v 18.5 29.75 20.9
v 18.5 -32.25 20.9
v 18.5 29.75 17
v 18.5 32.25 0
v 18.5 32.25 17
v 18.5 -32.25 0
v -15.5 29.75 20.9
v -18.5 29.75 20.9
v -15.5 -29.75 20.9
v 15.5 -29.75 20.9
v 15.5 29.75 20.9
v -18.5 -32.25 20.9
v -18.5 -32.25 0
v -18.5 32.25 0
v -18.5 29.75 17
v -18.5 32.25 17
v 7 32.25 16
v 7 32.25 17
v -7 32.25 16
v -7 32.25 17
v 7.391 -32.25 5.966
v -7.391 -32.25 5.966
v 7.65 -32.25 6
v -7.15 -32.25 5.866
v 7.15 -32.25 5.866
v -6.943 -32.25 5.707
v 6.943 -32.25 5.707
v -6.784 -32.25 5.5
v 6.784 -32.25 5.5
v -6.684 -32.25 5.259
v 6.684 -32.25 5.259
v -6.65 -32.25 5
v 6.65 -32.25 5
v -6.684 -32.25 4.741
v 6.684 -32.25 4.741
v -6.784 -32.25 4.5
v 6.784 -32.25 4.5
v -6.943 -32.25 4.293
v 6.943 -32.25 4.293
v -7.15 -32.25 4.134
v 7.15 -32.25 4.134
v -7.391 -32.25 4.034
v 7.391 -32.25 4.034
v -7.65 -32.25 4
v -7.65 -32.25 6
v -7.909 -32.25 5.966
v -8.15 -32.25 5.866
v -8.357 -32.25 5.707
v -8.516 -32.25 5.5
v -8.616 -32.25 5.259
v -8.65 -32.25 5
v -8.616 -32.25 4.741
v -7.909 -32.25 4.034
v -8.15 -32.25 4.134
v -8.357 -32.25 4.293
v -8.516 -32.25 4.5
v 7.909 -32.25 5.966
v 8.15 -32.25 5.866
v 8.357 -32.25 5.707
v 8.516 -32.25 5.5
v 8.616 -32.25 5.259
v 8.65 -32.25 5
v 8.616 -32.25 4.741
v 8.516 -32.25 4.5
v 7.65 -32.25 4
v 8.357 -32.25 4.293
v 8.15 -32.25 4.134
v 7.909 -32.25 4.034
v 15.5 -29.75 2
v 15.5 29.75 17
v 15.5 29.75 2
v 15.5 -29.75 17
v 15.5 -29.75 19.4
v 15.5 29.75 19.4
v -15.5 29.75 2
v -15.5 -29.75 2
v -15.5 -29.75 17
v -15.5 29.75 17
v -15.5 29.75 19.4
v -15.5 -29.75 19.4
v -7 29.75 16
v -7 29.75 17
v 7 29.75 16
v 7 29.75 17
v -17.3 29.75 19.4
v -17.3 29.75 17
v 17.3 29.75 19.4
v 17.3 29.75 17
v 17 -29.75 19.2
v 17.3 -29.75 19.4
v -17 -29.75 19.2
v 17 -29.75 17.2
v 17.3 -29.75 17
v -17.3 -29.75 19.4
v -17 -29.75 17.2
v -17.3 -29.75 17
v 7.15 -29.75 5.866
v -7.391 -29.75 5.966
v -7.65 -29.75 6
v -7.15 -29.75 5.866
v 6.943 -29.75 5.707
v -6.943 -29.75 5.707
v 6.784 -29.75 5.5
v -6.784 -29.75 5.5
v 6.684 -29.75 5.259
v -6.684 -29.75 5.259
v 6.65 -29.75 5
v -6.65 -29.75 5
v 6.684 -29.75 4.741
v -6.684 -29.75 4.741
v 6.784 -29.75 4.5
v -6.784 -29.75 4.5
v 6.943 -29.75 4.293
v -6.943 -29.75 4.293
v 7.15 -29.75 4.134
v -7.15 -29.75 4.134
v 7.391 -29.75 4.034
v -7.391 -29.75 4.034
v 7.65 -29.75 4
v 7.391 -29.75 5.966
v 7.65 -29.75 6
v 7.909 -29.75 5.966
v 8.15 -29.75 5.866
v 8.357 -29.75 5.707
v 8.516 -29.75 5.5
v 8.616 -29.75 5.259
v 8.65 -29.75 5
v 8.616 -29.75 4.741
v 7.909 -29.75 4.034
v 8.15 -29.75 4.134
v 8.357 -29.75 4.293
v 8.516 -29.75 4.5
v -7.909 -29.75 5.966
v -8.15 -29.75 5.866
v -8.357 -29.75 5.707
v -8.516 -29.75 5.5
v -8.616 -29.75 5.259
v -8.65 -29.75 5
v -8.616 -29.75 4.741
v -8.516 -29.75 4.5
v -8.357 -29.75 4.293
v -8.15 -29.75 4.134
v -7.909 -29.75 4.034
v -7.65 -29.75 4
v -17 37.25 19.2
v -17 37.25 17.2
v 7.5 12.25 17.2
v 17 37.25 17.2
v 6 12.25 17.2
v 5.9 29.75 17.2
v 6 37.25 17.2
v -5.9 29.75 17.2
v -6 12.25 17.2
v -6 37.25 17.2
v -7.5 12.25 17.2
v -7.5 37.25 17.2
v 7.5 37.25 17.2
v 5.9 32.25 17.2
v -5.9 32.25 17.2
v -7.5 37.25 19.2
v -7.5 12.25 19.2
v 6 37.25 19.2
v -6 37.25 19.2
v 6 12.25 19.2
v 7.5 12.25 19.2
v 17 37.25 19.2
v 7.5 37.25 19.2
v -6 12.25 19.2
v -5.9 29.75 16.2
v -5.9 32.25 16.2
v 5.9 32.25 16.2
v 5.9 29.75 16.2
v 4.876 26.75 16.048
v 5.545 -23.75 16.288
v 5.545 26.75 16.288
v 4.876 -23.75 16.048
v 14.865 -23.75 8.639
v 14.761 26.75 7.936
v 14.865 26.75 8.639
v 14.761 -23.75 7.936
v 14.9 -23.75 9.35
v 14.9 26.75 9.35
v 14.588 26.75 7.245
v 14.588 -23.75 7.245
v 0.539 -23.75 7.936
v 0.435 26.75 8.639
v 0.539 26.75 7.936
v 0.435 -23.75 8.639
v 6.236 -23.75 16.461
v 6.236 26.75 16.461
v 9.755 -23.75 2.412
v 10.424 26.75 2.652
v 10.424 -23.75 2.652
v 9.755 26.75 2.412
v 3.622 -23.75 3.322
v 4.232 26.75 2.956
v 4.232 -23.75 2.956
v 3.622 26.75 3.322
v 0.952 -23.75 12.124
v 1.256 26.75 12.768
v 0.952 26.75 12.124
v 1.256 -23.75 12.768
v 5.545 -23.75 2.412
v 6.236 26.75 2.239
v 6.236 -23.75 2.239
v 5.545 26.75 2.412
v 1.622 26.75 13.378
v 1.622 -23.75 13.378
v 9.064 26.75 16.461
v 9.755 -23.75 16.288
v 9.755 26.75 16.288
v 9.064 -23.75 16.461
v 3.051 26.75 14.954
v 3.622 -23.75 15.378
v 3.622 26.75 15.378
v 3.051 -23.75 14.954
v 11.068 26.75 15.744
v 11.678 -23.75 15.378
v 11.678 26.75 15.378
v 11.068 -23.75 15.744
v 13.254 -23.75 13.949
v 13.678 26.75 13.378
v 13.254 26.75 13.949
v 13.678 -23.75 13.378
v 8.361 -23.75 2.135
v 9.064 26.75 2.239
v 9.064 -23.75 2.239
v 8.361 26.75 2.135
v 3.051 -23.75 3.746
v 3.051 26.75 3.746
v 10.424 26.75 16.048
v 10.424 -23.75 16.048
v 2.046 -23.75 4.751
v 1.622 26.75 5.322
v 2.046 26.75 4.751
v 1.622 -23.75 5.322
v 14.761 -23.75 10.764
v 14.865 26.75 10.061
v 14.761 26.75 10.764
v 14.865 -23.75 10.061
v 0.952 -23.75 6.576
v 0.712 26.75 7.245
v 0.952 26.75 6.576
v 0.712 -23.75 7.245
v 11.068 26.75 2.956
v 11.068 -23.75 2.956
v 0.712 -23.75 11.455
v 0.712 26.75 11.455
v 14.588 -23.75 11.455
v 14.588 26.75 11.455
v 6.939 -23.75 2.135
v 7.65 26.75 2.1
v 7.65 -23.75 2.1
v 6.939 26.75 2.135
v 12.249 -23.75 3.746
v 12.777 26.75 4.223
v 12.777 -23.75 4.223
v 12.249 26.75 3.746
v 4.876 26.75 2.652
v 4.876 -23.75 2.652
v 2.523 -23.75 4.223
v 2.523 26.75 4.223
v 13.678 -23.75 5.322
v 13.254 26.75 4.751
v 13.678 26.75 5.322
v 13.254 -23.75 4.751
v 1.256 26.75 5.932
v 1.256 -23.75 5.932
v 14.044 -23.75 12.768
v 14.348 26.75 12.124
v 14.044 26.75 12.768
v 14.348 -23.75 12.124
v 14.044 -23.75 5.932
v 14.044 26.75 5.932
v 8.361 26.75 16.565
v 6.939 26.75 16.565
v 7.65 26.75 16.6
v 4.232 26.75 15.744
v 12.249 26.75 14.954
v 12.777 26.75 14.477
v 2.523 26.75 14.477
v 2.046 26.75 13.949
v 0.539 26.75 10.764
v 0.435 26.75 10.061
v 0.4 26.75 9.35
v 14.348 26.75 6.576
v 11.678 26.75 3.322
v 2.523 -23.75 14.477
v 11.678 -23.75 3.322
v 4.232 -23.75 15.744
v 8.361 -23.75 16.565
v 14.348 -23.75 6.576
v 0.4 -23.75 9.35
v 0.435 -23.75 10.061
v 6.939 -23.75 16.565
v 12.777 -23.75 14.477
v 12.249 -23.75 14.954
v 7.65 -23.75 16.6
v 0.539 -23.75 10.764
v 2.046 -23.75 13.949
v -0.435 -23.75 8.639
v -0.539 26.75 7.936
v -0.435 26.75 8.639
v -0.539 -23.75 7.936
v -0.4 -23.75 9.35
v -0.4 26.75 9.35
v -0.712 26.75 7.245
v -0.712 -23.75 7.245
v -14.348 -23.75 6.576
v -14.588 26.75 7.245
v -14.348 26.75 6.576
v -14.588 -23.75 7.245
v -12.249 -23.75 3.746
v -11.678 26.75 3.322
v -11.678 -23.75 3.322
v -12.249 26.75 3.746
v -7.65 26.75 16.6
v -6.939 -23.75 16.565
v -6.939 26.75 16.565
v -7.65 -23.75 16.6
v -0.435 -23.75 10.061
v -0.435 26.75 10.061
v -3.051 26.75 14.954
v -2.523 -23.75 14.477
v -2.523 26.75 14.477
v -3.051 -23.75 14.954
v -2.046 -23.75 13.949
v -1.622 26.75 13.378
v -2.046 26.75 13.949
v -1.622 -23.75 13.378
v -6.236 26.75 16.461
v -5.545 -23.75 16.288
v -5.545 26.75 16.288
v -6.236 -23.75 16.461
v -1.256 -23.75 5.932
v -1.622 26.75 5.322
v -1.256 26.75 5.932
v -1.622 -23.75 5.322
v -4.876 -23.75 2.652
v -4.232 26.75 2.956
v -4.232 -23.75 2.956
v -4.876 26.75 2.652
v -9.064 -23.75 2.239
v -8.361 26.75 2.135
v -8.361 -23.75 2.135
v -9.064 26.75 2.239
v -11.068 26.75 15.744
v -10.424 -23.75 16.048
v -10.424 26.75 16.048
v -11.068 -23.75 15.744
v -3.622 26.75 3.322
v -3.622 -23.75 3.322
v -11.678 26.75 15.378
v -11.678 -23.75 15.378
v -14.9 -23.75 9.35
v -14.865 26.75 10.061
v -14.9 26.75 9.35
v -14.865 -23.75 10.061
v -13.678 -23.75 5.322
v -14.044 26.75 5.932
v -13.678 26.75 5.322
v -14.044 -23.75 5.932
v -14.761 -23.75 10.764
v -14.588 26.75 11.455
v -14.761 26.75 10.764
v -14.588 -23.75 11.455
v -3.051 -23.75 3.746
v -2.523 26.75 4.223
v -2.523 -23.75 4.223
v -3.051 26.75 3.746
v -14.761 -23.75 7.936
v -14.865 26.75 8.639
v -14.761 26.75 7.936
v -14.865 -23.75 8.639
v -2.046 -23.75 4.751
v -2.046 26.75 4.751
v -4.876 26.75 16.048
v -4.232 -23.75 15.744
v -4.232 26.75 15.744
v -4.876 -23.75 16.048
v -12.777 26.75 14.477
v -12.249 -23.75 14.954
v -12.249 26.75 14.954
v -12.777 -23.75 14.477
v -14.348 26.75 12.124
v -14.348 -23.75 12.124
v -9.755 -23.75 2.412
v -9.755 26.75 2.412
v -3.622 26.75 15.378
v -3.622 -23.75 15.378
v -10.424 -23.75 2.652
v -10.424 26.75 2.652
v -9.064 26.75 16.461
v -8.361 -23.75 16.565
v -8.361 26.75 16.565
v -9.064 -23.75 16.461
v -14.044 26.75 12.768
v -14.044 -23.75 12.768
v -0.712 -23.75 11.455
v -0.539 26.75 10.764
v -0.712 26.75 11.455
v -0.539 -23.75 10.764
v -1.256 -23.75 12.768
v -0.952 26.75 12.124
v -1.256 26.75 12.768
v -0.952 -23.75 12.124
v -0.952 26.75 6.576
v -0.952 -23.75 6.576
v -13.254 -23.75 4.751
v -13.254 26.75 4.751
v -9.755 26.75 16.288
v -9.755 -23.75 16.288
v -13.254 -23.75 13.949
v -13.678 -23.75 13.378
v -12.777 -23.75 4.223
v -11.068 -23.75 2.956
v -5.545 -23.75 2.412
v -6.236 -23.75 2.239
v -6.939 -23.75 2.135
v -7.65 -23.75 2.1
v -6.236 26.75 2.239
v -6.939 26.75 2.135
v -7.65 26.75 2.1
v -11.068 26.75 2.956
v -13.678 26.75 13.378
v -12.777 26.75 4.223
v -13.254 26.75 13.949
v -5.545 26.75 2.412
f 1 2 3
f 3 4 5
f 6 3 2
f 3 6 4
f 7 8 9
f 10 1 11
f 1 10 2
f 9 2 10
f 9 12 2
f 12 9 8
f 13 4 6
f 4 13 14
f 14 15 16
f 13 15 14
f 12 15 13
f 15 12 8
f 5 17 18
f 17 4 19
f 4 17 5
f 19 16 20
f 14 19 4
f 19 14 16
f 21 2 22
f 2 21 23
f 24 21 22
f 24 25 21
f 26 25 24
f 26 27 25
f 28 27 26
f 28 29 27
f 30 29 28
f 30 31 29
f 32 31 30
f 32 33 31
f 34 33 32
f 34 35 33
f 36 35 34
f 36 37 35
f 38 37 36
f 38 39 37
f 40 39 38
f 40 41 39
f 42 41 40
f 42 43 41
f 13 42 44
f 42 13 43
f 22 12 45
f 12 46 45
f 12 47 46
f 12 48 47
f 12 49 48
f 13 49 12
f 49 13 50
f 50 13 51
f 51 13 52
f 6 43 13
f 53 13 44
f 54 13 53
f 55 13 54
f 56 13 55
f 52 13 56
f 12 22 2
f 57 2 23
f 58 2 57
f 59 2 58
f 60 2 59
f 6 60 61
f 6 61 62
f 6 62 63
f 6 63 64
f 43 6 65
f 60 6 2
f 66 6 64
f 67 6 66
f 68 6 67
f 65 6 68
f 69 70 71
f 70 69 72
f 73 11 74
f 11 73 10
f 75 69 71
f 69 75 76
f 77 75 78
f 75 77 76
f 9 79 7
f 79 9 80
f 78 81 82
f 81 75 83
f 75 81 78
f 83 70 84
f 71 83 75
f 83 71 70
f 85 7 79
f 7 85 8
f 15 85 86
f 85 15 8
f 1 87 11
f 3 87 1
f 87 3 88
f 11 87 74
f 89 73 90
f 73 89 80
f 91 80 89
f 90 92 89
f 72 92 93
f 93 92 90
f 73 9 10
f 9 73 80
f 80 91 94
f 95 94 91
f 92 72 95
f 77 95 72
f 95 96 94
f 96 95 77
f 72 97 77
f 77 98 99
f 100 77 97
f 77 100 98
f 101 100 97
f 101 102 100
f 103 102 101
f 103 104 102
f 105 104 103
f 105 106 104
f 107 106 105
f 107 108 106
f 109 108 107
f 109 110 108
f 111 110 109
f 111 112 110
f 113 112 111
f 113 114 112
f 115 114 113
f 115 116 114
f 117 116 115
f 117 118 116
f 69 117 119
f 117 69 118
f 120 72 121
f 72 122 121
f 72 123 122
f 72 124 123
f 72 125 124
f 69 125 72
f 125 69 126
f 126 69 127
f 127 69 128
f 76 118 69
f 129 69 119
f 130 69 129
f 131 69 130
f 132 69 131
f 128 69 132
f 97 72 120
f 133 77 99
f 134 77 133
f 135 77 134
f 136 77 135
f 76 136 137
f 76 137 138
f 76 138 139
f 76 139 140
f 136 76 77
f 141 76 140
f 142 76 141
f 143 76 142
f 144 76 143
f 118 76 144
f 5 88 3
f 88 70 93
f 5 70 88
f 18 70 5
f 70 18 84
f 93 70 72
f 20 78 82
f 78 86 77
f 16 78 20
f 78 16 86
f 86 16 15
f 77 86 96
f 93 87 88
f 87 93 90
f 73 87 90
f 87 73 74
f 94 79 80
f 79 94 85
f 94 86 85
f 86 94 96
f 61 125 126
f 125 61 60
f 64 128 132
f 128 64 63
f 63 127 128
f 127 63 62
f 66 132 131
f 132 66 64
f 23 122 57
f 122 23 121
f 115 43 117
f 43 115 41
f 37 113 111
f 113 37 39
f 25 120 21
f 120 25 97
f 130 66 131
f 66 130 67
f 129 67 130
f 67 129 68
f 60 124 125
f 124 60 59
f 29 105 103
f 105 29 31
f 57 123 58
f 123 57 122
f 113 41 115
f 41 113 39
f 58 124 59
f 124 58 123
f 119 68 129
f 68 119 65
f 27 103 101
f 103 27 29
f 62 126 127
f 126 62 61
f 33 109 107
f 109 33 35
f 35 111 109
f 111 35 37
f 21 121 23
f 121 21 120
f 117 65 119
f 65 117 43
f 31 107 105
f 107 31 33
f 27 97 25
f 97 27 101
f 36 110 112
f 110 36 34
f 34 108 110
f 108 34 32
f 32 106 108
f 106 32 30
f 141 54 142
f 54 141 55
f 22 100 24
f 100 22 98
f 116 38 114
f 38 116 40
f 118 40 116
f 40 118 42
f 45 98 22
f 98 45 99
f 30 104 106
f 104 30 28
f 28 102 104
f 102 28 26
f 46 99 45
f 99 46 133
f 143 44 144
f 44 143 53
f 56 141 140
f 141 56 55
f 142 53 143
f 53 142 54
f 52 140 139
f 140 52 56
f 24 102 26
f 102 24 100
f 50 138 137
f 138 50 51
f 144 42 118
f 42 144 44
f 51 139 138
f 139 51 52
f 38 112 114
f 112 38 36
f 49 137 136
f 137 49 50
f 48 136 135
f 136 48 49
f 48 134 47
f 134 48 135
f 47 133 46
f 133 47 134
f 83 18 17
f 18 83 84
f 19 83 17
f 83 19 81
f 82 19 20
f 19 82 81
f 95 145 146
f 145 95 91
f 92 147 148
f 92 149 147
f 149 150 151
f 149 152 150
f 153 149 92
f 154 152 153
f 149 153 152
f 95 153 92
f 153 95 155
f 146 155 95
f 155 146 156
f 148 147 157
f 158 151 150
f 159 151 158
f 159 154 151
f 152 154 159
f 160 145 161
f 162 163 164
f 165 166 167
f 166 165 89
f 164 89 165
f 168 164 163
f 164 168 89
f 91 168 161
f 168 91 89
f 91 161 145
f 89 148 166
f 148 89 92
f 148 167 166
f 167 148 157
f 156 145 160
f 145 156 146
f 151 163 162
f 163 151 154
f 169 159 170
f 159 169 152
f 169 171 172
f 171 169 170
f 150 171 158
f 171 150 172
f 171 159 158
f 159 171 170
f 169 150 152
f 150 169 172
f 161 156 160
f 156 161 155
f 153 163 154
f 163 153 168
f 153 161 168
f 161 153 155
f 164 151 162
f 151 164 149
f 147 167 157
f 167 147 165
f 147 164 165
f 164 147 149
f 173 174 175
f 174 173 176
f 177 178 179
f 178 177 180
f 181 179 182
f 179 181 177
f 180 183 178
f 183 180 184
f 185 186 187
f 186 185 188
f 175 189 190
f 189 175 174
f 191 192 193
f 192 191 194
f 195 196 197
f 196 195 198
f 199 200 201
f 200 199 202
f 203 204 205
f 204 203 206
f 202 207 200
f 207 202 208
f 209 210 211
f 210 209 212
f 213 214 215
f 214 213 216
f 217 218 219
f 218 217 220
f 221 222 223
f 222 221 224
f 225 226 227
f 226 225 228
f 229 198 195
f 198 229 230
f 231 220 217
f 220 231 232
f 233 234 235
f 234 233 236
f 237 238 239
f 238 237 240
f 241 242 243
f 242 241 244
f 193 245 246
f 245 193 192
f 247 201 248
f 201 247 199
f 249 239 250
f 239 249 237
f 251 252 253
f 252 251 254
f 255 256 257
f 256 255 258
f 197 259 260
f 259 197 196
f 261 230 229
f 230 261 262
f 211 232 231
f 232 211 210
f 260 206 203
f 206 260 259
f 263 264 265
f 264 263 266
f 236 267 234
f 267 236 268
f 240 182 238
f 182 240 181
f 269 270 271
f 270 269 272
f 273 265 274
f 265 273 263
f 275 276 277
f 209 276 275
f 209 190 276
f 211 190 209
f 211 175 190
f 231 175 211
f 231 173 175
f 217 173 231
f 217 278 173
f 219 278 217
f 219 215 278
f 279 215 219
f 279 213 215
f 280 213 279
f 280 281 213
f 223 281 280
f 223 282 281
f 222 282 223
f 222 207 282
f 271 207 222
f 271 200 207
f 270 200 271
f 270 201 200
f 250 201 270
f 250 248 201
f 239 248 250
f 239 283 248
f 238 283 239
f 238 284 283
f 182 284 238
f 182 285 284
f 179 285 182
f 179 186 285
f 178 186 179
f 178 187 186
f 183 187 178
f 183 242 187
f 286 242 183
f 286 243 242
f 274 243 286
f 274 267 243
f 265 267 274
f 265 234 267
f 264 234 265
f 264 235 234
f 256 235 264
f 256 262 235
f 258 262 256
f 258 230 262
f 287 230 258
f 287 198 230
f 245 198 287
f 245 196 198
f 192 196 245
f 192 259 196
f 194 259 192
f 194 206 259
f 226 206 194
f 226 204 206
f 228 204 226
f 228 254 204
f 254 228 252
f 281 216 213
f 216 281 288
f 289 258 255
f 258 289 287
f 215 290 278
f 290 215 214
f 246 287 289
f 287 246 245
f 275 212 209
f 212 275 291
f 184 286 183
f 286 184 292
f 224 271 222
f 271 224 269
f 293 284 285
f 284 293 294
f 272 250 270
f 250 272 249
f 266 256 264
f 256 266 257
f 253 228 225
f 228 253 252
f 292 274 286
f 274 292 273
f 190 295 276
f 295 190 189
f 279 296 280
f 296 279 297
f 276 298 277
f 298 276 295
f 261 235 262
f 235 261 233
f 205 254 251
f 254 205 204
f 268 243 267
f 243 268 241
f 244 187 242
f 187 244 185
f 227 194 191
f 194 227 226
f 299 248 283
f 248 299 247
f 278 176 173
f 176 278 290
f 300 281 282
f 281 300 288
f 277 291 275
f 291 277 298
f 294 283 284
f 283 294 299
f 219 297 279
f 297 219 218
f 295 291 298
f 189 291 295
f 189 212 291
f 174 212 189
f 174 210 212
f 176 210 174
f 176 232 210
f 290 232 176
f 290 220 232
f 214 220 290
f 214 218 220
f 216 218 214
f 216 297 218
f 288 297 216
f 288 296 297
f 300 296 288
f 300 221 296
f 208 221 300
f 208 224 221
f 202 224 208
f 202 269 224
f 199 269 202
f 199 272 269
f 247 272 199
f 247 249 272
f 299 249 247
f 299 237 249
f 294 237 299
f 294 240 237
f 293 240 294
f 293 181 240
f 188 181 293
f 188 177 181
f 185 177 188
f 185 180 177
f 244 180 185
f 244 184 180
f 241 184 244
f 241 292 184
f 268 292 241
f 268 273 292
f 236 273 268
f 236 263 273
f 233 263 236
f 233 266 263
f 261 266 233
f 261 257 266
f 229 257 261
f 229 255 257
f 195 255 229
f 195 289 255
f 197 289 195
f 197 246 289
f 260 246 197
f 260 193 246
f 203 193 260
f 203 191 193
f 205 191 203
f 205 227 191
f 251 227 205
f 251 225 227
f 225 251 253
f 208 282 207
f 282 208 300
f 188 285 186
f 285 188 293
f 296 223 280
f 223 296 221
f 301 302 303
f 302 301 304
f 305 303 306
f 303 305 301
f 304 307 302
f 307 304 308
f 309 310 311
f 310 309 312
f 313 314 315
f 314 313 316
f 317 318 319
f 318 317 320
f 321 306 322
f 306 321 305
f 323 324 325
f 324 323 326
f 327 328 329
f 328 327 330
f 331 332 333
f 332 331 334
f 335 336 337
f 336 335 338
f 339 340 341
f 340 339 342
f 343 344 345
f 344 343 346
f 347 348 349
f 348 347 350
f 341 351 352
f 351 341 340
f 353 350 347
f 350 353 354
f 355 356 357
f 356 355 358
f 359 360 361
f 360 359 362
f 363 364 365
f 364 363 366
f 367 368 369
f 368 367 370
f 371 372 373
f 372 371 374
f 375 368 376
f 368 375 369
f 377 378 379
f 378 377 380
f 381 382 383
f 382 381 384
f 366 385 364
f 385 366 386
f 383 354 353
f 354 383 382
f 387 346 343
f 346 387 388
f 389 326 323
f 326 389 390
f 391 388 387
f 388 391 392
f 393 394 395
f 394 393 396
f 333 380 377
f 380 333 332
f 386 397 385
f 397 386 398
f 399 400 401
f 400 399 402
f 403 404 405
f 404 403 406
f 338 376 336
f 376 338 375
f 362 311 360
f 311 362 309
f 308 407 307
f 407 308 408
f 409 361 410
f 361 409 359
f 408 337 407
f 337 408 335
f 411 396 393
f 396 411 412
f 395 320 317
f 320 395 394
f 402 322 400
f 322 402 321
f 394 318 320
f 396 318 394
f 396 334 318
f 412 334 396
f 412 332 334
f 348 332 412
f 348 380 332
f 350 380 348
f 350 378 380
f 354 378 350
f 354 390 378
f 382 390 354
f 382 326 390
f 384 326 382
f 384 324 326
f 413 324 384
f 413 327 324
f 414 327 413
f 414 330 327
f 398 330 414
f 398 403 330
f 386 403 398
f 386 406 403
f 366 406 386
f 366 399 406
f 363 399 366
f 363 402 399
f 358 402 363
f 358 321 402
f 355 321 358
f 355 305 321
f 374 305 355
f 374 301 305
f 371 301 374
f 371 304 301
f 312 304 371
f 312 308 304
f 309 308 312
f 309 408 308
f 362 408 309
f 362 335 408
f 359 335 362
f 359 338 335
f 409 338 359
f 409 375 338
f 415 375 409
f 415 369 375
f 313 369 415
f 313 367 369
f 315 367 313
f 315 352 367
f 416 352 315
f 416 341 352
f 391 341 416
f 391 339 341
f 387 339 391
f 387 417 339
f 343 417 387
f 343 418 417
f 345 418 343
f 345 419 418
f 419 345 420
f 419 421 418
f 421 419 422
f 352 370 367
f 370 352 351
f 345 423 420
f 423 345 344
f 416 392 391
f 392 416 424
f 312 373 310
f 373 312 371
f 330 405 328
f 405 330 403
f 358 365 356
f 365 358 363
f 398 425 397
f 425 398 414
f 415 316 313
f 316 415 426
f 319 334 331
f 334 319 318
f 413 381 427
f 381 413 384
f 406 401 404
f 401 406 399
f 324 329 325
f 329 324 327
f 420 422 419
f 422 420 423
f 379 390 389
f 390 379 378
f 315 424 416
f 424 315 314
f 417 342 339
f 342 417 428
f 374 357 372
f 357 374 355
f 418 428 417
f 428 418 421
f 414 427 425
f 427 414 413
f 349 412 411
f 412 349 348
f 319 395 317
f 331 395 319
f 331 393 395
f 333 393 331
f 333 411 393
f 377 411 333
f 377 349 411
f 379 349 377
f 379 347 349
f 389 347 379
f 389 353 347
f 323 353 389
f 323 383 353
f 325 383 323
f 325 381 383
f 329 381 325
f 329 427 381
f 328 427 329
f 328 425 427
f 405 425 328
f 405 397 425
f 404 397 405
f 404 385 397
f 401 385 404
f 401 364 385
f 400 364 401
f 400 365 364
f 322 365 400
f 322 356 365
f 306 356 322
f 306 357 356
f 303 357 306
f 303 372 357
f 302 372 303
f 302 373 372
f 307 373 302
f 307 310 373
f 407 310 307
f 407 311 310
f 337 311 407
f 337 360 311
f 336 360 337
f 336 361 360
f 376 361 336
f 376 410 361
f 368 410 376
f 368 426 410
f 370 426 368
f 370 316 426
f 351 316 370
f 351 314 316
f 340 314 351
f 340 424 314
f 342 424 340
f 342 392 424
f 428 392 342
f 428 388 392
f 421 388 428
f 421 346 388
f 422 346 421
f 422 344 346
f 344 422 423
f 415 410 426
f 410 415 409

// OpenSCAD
/* Holder for two AA batteries with sliding cover.
   PLA, 0.4mm nozzle, no supports. Units mm.
   Print orientation: +Z up, parts rest on min z.
*/

// ---------- parameters ----------
battery_d = 14.5;
battery_l = 50.5;
side_gap = 0.6;      // battery side to wall
mid_gap = 0.8;       // between batteries
Wi = 2*battery_d + mid_gap + 2*side_gap; // 31.0 interior width
Li = battery_l + 3 + 6;                  // 59.5 interior length
floor_t = 2.0;
side_t = 3.0;
end_t = 2.5;
Wext = Wi + 2*side_t;   // 37
Lext = Li + 2*end_t;    // 64.5
wall_top = 20.9;
low_top = 17.0;
groove_bottom = 17.0;
groove_h = 2.4;
groove_top = groove_bottom + groove_h; // 19.4
groove_depth = 1.8;
engage = 1.5;
Wc = Wi + 2*engage;     // 34 cover width
Lc0 = Lext;             // 64.5 main length
lip_len = 5.0;
Lc = Lc0 + lip_len;     // 69.5 total cover length
y0b = -Lext/2;          // -32.25 base min y
y1b = Lext/2;           // 32.25 base max y
y0c = -Lext/2;          // -32.25 cover min y
y1c = Lext/2 + lip_len; // 37.25 cover max y
tc = 2.0;
finger_w = 12;
slot_w = 1.5;
finger_y0 = 12.25;
tooth_w = 11.8;
tooth_yl = 2.5;
tooth_y0 = 29.75;
tooth_y1 = tooth_y0 + tooth_yl; // 32.25
tooth_h = 1.0;
notch_hw = 7;
notch_y0 = 29.65;
notch_y1 = 32.35;
notch_bot = 16.0;
bx = battery_d/2 + mid_gap/2; // 7.65 battery center x
battery_y0 = -Li/2 + 6;       // -23.75 spring side
battery_y1 = battery_y0 + battery_l; // 26.75
battery_yc = (battery_y0 + battery_y1)/2; // 1.5
battery_zc = floor_t + battery_d/2 + 0.1; // 9.35 slight lift
wire_z = 5;
wire_r = 1.0;

part = "assembly"; // [base, cover, assembly]
cadverify_only = "";
module instance(name, part, unit = 1) {
    echo(cadverify_instance = [name, part, unit]);
    if (cadverify_only == "" || cadverify_only == name) children();
}

module battery() {
    rotate([-90,0,0])
        cylinder(d=battery_d, h=battery_l, center=true, $fn=64);
}

module base() {
    difference() {
        // outer solid
        translate([-Wext/2, y0b, 0])
            cube([Wext, Lext, wall_top]);
        // interior cavity open at top
        translate([-Wi/2, -Li/2, floor_t])
            cube([Wi, Li, wall_top - floor_t + 1]);
        // low end wall cut (+Y end)
        translate([-Wext/2, Li/2, low_top])
            cube([Wext, Lext/2 - Li/2 + 0.5, wall_top - low_top + 1]);
        // left groove
        translate([Wi/2, -Li/2, groove_bottom])
            cube([groove_depth, Li/2 + Lext/2 + 0.5, groove_h]);
        // right groove
        translate([-Wi/2 - groove_depth, -Li/2, groove_bottom])
            cube([groove_depth, Li/2 + Lext/2 + 0.5, groove_h]);
        // wire holes through spring (-Y) wall
        translate([bx, y0b - 1, wire_z])
            rotate([-90,0,0])
                cylinder(r=wire_r, h=end_t + 2, $fn=24);
        translate([-bx, y0b - 1, wire_z])
            rotate([-90,0,0])
                cylinder(r=wire_r, h=end_t + 2, $fn=24);
        // latch notch in low wall top
        translate([-notch_hw, notch_y0, notch_bot])
            cube([2*notch_hw, notch_y1 - notch_y0, low_top - notch_bot + 0.02]);
    }
}

module cover() {
    // print orientation: plate 0..tc, tooth on top tc..tc+tooth_h
    difference() {
        union() {
            translate([-Wc/2, y0c, 0])
                cube([Wc, Lc, tc]);
            // latch tooth on top (becomes bottom after flip)
            translate([-tooth_w/2, tooth_y0, tc])
                cube([tooth_w, tooth_yl, tooth_h]);
        }
        // finger slots, open at +Y lip end
        translate([finger_w/2, finger_y0, -0.5])
            cube([slot_w, y1c - finger_y0 + 0.5, tc + 1.5]);
        translate([-finger_w/2 - slot_w, finger_y0, -0.5])
            cube([slot_w, y1c - finger_y0 + 0.5, tc + 1.5]);
    }
}

module assembly() {
    instance("base", "base", 1) base();
    instance("battery_left", "external", 1)
        translate([bx, battery_yc, battery_zc]) battery();
    instance("battery_right", "external", 1)
        translate([-bx, battery_yc, battery_zc]) battery();
    // cover printed upside-down: rotate 180 about Y then lift
    instance("cover", "cover", 1)
        translate([0, 0, 19.2]) rotate([0,180,0]) cover();
}

// ---------- specs ----------
if (part == "base") {
    echo(cadverify_spec = [
        ["bounds", [[-Wext/2, y0b, 0], [Wext/2, y1b, wall_top]]],
        ["bodies", 1],
        ["through_holes", 2],
        ["support_faces", [["bottom", "-z", 2000]]],
        ["overhangs_allowed", [
            ["groove ceilings bridge 3.6mm", [[Wi/2 - 0.6, -Li/2 - 0.5, groove_bottom - 0.5], [Wi/2 + groove_depth + 0.5, y1b + 0.2, groove_top + 0.6]]],
            ["groove ceilings bridge 3.6mm", [[-Wi/2 - groove_depth - 0.5, -Li/2 - 0.5, groove_bottom - 0.5], [-Wi/2 + 0.6, y1b + 0.2, groove_top + 0.6]]],
            ["wire holes 2mm dia bridges", [[-10, y0b - 0.5, wire_z - 1.5], [10, -Li/2 + 0.5, wire_z + 1.5]]]
        ]],
        ["copies", 1],
        ["details", [
            ["cavity", "void", [[-Wi/2, -Li/2, floor_t], [Wi/2, Li/2, 17]], 0.9],
            ["spring_room", "void", [[-Wi/2, -Li/2, floor_t], [Wi/2, -Li/2 + 6, 16.6]], 0.9],
            ["pos_room", "void", [[-Wi/2, Li/2 - 3, floor_t], [Wi/2, Li/2, 16.6]], 0.9],
            ["groove_left", "void", [[Wi/2, -Li/2, groove_bottom], [Wi/2 + groove_depth, y1b, groove_top]], 0.85],
            ["groove_right", "void", [[-Wi/2 - groove_depth, -Li/2, groove_bottom], [-Wi/2, y1b, groove_top]], 0.85],
            ["notch", "void", [[-notch_hw, notch_y0, notch_bot], [notch_hw, notch_y1, low_top + 0.02]], 0.85],
            ["wire1", "hole", [bx, y0b - 1, wire_z], [0, 1, 0], [[0, 2], [2.5, 2]]],
            ["wire2", "hole", [-bx, y0b - 1, wire_z], [0, 1, 0], [[0, 2], [2.5, 2]]],
            ["floor", "thickness", [0, 0, -1], [0, 0, 1], 2.0],
            ["side_wall", "thickness", [Wext/2 + 1, 0, 18.2], [-1, 0, 0], 1.2],
            ["end_wall", "thickness", [0, y1b + 1, 10], [0, -1, 0], 2.5]
        ]]
    ]);
    base();
} else if (part == "cover") {
    echo(cadverify_spec = [
        ["bounds", [[-Wc/2, y0c, 0], [Wc/2, y1c, tc + tooth_h]]],
        ["bodies", 1],
        ["through_holes", 0],
        ["support_faces", [["bottom", "-z", 1500]]],
        ["overhangs_allowed", []],
        ["copies", 1],
        ["details", [
            ["plate", "thickness", [0, -10, -1], [0, 0, 1], 2.0],
            ["finger", "material", [[-finger_w/2, finger_y0, 0], [finger_w/2, y1c, tc]], 0.85],
            ["slot_left", "void", [[finger_w/2, finger_y0, -0.5], [finger_w/2 + slot_w, y1c + 0.01, tc + 0.5]], 0.85],
            ["slot_right", "void", [[-finger_w/2 - slot_w, finger_y0, -0.5], [-finger_w/2, y1c + 0.01, tc + 0.5]], 0.85],
            ["tooth", "material", [[-tooth_w/2, tooth_y0, tc], [tooth_w/2, tooth_y1, tc + tooth_h]], 0.85],
            ["lip", "material", [[-Wc/2, y1b, 0], [Wc/2, y1c, tc]], 0.9]
        ]]
    ]);
    cover();
} else if (part == "assembly") {
    echo(cadverify_spec = [
        ["bounds", [[-Wext/2, y0b, 0], [Wext/2, y1c, wall_top]]],
        ["support_faces", [["bottom", "-z", 2000]]],
        ["allowed_interferences", []],
        ["motions", [
            ["slide_cover", ["cover"], "slide", [0, 1, 0], [0, 50], ["flex", [["cover", "base", 1.0, "latch tooth rides over end wall"]]]]
        ]],
        ["assembly_order", [
            [["base"], [0, 0, 0]],
            [["battery_left"], [0, 0, -1]],
            [["battery_right"], [0, 0, -1]],
            [["cover"], [0, -1, 0]]
        ]]
    ]);
    assembly();
}
